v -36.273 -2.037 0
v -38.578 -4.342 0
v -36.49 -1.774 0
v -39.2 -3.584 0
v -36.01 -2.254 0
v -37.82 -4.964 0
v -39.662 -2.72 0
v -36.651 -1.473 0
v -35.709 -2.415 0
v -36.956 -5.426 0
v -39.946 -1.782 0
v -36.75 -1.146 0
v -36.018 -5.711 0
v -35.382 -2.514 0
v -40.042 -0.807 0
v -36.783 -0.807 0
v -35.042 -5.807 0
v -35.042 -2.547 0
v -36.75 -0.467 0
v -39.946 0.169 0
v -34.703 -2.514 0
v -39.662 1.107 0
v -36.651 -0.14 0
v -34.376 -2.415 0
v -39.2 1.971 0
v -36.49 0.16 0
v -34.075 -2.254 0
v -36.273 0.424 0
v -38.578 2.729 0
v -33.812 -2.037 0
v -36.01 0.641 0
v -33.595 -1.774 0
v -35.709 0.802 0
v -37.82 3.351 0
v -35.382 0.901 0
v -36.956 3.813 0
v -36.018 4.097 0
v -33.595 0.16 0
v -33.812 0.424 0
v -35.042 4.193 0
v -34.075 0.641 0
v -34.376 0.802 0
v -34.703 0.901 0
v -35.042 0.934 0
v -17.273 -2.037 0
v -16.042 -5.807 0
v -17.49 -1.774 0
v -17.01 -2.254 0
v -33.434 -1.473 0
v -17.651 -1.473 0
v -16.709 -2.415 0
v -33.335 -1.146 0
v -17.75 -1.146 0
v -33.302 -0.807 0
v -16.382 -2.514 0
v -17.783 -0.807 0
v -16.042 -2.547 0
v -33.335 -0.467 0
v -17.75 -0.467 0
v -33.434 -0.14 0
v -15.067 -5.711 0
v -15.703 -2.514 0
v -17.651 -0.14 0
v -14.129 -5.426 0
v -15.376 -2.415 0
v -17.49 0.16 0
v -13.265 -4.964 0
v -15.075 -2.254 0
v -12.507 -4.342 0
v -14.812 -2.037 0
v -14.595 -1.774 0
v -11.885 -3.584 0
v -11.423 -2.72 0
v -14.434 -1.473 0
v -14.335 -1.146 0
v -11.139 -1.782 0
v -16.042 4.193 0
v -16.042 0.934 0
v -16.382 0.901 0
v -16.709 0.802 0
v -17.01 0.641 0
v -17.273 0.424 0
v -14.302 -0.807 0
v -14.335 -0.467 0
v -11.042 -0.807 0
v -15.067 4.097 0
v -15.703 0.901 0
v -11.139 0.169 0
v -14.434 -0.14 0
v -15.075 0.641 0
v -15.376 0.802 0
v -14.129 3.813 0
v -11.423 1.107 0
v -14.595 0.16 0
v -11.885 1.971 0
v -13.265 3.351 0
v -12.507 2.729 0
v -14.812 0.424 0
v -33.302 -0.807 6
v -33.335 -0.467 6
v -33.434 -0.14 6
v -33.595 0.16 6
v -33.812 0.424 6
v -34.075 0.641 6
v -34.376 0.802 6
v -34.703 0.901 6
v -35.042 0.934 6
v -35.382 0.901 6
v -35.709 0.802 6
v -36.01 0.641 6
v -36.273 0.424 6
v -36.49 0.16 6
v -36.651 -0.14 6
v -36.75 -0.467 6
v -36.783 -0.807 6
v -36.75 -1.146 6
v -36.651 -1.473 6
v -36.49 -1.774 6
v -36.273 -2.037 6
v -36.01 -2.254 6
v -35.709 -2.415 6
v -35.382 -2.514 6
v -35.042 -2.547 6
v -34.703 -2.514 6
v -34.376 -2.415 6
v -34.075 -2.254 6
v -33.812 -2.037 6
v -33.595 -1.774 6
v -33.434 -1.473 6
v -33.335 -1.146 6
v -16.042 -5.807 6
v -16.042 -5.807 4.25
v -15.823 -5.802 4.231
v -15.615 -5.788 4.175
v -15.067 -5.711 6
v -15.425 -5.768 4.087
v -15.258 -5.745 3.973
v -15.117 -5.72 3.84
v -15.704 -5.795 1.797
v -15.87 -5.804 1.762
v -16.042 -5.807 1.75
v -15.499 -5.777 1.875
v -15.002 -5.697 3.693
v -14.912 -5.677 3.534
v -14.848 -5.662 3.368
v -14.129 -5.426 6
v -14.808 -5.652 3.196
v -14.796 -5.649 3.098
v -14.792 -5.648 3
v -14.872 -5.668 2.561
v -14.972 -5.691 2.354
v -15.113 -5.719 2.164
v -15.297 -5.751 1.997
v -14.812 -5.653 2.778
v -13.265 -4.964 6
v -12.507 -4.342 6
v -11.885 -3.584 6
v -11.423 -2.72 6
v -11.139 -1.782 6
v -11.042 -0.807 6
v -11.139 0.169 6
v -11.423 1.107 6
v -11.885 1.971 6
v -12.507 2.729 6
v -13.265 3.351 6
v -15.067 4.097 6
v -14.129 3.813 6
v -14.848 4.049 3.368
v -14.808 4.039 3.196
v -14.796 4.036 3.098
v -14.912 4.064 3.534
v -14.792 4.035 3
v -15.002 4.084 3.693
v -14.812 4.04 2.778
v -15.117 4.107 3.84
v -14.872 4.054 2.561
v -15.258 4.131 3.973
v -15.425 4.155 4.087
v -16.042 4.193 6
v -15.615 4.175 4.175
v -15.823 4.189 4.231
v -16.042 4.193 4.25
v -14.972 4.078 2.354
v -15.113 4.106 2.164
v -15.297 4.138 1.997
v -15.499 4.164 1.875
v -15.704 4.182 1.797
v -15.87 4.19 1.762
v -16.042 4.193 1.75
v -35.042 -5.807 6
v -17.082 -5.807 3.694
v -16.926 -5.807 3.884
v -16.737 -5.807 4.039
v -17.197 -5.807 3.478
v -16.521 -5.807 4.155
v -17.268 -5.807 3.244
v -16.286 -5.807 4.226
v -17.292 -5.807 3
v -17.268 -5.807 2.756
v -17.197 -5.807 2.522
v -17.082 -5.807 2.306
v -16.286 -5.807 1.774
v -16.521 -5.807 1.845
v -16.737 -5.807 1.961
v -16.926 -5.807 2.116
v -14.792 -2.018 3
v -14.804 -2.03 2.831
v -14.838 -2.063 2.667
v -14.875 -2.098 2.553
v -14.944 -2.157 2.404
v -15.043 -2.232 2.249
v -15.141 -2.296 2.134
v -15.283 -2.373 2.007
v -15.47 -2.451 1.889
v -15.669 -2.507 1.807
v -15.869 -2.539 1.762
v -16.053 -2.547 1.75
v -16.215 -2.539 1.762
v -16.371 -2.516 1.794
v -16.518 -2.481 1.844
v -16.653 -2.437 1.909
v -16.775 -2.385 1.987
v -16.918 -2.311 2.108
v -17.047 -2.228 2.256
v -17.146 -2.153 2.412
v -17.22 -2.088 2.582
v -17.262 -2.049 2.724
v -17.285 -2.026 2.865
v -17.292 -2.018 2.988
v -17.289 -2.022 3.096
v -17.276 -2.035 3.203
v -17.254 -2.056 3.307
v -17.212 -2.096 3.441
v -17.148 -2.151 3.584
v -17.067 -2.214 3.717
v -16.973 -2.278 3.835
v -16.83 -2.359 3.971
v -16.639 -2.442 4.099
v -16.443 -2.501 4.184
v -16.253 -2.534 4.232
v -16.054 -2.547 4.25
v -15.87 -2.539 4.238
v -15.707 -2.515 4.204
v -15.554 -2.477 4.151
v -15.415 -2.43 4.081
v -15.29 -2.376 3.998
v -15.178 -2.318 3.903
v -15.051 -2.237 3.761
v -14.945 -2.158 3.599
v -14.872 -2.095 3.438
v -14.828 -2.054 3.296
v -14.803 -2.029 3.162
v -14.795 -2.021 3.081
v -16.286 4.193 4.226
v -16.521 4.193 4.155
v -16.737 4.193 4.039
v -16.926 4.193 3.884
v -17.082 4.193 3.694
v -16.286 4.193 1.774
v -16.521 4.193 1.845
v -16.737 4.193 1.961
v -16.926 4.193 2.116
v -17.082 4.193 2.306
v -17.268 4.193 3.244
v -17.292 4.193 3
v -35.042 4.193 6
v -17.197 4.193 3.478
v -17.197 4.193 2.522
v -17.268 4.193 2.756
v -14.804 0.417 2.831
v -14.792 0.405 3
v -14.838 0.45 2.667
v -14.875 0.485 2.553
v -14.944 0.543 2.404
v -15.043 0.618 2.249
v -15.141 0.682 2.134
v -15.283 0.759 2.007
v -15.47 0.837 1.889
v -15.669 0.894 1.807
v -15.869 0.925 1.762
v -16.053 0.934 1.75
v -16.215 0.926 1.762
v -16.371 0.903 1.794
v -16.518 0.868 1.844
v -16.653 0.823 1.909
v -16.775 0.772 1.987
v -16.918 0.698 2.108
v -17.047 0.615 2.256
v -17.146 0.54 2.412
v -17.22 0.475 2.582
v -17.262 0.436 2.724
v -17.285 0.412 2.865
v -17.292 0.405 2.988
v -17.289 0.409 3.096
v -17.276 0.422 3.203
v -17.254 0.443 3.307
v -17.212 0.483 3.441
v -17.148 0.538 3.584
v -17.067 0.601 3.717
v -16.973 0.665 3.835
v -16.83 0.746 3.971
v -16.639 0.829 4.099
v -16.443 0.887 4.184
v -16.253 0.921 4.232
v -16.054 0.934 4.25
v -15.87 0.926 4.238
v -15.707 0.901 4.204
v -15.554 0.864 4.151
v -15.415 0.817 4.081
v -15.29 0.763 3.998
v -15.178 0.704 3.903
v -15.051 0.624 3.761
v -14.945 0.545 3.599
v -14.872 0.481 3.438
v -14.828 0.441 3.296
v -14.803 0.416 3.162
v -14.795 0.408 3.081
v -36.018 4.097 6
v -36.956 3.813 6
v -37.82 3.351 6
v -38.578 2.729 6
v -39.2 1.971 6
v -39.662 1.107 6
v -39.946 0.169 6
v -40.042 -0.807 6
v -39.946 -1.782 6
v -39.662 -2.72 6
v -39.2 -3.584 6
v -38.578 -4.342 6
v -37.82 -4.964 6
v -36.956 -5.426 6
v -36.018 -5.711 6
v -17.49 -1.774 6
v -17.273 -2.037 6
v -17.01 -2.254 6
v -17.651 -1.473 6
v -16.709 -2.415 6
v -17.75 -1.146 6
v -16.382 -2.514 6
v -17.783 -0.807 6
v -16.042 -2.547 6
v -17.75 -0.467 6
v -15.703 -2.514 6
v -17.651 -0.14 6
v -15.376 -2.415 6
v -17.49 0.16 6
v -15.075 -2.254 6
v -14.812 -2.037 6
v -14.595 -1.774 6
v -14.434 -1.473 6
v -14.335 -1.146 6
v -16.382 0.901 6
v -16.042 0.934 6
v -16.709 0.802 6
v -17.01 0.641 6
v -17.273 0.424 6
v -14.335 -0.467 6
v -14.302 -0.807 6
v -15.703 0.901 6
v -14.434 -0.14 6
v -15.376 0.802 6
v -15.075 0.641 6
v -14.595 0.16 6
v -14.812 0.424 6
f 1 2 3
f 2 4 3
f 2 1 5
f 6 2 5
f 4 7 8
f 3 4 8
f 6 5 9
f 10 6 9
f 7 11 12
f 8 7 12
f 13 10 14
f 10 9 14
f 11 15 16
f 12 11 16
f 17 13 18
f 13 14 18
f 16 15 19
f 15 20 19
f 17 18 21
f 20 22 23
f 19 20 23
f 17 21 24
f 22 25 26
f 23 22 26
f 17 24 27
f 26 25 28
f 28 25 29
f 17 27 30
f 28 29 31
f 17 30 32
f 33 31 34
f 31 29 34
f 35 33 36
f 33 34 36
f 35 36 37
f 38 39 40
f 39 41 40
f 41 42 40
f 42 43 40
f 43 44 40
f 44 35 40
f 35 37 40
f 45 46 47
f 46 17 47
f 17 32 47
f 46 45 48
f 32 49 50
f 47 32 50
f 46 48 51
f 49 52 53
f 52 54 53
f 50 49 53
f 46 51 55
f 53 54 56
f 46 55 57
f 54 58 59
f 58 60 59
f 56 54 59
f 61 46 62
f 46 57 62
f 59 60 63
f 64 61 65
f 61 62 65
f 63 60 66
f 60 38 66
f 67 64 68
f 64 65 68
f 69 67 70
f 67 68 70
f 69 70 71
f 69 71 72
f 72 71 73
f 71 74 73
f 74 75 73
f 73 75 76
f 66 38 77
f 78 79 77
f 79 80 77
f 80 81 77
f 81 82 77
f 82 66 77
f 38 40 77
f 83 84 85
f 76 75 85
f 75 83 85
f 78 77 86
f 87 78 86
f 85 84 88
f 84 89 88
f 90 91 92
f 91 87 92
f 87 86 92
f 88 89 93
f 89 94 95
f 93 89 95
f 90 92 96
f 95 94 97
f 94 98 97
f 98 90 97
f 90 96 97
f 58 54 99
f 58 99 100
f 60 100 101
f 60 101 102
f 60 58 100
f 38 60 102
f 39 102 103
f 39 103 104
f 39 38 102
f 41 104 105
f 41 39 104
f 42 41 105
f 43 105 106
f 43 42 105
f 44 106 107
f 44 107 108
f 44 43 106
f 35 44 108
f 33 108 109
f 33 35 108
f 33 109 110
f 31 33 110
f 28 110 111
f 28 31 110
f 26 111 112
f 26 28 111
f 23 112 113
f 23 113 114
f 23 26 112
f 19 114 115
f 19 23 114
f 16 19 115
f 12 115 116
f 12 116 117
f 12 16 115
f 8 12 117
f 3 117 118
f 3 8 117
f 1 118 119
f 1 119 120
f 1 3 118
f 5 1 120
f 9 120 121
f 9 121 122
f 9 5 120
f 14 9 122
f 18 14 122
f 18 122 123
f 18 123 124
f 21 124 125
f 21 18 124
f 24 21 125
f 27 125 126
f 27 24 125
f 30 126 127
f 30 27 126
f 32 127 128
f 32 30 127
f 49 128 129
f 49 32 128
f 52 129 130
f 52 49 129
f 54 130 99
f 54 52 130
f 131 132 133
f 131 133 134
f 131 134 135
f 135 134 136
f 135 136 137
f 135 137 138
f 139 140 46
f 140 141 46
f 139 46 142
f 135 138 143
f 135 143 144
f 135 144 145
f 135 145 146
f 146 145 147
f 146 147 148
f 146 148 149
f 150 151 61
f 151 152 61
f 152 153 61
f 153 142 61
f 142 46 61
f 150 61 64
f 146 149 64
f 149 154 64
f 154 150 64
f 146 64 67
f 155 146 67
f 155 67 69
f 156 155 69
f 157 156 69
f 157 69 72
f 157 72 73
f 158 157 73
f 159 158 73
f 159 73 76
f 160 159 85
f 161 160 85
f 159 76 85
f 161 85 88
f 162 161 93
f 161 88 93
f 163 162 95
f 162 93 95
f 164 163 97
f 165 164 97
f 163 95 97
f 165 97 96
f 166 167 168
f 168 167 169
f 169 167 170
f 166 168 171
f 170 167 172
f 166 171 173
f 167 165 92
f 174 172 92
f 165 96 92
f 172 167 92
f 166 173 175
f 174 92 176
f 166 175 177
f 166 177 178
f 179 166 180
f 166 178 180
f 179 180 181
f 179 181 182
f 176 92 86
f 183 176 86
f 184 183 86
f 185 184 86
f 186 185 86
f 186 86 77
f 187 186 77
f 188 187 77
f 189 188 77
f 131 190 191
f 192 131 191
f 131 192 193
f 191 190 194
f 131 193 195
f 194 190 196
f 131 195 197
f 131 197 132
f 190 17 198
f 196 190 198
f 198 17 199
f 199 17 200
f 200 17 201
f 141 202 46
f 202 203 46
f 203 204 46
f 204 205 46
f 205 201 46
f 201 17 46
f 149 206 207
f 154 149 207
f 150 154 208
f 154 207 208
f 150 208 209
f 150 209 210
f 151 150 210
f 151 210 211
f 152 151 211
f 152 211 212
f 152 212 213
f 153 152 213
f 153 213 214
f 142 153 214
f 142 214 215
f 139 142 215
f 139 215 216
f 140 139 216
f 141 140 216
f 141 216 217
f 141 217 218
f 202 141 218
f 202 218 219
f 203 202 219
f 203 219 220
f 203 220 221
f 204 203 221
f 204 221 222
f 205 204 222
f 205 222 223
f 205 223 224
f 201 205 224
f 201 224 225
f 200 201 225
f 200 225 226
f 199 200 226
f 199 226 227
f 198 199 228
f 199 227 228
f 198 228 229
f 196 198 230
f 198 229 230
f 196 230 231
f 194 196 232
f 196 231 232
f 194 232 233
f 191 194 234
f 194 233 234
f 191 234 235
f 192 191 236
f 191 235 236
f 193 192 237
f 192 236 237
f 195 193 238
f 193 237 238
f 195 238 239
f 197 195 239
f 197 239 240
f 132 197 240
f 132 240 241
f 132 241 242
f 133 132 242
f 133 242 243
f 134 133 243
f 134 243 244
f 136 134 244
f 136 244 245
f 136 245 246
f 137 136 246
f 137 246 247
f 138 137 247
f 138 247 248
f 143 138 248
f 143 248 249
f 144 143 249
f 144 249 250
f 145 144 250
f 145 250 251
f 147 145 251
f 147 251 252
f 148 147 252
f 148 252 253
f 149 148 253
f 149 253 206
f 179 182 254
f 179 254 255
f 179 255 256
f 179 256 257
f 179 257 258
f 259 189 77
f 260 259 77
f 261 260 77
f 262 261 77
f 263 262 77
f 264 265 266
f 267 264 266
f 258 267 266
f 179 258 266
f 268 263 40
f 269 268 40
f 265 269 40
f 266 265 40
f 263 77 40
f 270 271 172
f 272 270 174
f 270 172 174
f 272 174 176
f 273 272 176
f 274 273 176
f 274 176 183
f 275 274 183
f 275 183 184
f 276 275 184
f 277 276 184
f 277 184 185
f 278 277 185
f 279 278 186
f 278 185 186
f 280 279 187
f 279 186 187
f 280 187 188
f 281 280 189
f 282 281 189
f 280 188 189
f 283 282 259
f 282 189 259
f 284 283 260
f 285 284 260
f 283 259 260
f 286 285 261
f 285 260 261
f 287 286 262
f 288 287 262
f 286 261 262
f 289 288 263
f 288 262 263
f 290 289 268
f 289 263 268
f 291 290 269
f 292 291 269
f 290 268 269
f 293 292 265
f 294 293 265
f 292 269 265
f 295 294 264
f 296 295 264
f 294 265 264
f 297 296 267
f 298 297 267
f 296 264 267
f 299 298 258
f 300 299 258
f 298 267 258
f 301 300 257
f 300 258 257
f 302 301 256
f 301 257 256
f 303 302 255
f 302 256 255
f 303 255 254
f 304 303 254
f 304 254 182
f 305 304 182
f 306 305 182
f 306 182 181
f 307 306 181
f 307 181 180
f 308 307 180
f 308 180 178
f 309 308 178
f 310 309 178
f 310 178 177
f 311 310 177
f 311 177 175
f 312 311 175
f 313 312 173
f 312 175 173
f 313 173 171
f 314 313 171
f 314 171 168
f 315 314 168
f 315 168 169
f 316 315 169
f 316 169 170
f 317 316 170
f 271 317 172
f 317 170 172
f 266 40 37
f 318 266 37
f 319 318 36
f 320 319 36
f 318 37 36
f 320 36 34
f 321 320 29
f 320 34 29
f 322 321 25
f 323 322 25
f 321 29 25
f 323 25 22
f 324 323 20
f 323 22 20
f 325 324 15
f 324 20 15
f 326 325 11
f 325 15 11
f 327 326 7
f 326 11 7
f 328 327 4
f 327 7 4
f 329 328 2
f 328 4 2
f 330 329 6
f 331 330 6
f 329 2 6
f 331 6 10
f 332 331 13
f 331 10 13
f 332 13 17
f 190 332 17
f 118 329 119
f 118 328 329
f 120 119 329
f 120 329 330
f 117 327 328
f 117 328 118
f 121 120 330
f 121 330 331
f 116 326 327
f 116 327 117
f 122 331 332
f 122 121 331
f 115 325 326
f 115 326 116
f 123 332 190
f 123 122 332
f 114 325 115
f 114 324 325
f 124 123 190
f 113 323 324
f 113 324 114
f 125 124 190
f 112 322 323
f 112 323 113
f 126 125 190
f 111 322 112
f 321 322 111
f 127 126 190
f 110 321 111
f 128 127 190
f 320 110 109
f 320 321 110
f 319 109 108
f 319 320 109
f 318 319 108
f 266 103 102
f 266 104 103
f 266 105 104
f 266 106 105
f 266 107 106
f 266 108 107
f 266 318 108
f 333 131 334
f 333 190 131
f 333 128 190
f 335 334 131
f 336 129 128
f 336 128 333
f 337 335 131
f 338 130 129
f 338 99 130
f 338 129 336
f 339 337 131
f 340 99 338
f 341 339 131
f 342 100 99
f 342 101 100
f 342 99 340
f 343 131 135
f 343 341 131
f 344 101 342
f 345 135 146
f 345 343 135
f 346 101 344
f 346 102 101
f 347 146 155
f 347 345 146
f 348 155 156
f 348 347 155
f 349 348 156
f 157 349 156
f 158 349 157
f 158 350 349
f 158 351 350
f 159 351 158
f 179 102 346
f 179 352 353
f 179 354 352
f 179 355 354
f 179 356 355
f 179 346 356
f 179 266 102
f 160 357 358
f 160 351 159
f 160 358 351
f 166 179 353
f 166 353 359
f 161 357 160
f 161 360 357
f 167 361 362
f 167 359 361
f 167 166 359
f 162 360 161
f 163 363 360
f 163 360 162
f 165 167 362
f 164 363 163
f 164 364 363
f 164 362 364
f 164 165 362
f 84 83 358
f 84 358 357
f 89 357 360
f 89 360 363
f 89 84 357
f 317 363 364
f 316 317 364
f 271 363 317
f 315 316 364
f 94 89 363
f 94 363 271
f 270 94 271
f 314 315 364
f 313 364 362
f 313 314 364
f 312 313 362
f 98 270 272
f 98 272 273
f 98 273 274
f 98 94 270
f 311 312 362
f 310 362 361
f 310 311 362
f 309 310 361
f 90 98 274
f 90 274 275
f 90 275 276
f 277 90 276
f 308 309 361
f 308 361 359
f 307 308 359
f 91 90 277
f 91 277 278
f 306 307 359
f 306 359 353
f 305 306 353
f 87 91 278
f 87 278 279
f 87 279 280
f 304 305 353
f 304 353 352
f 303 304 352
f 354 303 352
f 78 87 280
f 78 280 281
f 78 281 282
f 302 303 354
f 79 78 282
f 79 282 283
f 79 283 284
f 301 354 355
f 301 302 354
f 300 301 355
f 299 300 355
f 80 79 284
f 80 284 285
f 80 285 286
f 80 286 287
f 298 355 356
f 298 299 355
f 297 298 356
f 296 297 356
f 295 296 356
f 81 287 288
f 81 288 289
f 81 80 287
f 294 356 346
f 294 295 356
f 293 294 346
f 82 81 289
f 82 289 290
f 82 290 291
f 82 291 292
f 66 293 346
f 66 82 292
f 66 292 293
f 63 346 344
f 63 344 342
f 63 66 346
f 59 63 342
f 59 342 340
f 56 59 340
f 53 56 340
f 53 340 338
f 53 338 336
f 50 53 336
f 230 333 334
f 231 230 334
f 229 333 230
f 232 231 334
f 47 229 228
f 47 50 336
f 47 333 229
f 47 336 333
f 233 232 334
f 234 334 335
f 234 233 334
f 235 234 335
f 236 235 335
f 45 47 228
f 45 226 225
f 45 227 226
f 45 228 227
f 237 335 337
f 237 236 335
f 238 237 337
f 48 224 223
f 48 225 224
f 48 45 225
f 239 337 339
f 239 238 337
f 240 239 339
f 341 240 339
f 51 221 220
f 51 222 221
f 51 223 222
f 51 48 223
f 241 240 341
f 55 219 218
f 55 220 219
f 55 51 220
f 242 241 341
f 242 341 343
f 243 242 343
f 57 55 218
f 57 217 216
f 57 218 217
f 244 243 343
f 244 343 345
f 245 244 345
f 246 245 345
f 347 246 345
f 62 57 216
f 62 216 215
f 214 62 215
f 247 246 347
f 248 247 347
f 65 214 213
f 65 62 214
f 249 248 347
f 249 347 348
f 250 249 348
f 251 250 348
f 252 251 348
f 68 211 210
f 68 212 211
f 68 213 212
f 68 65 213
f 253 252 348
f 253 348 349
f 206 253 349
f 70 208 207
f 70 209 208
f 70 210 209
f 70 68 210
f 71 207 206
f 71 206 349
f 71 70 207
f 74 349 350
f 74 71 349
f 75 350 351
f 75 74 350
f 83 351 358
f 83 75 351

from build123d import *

# Parameters (mm, degrees)
SKETCH1_R           = 5
SKETCH1_R_2         = 1.740677898
BOSS_EXTRUDE1_DEPTH = 6
SKETCH2_R           = 1.25
CUT_EXTRUDE1_DEPTH  = 11


with BuildPart() as part:
    # Sketch1 → Boss-Extrude1 (new body)
    with BuildSketch(Plane.XY):
        with Locations((-35.04245283, -0.806603774)):
            Circle(SKETCH1_R)
        with Locations((-35.04245283, -0.806603774)):
            Circle(SKETCH1_R_2, mode=Mode.SUBTRACT)
        with BuildLine():
            Line((-16.04245283, 4.193396226), (-35.04245283, 4.193396226))
            ThreePointArc((-35.04245283, 4.193396226), (-31.506918924, 2.728930132), (-30.04245283, -0.806603774))
            ThreePointArc((-30.04245283, -0.806603774), (-31.506918924, -4.34213768), (-35.04245283, -5.806603774))
            Line((-35.04245283, -5.806603774), (-16.04245283, -5.806603774))
            ThreePointArc((-16.04245283, -5.806603774), (-21.04245283, -0.806603774), (-16.04245283, 4.193396226))
        make_face()
        with Locations((-16.04245283, -0.806603774)):
            Circle(SKETCH1_R)
        with Locations((-16.04245283, -0.806603774)):
            Circle(SKETCH1_R_2, mode=Mode.SUBTRACT)
    extrude(amount=BOSS_EXTRUDE1_DEPTH)

    # Sketch2 → Cut-Extrude1 (cut, through all)
    with BuildSketch(Plane(origin=(0, 4.193396226, 0), x_dir=(1, 0, 0), z_dir=(0, 1, 0))):
        with Locations((-16.04245283, -3)):
            Circle(SKETCH2_R)
    extrude(amount=-CUT_EXTRUDE1_DEPTH, mode=Mode.SUBTRACT)


solid = part.part
